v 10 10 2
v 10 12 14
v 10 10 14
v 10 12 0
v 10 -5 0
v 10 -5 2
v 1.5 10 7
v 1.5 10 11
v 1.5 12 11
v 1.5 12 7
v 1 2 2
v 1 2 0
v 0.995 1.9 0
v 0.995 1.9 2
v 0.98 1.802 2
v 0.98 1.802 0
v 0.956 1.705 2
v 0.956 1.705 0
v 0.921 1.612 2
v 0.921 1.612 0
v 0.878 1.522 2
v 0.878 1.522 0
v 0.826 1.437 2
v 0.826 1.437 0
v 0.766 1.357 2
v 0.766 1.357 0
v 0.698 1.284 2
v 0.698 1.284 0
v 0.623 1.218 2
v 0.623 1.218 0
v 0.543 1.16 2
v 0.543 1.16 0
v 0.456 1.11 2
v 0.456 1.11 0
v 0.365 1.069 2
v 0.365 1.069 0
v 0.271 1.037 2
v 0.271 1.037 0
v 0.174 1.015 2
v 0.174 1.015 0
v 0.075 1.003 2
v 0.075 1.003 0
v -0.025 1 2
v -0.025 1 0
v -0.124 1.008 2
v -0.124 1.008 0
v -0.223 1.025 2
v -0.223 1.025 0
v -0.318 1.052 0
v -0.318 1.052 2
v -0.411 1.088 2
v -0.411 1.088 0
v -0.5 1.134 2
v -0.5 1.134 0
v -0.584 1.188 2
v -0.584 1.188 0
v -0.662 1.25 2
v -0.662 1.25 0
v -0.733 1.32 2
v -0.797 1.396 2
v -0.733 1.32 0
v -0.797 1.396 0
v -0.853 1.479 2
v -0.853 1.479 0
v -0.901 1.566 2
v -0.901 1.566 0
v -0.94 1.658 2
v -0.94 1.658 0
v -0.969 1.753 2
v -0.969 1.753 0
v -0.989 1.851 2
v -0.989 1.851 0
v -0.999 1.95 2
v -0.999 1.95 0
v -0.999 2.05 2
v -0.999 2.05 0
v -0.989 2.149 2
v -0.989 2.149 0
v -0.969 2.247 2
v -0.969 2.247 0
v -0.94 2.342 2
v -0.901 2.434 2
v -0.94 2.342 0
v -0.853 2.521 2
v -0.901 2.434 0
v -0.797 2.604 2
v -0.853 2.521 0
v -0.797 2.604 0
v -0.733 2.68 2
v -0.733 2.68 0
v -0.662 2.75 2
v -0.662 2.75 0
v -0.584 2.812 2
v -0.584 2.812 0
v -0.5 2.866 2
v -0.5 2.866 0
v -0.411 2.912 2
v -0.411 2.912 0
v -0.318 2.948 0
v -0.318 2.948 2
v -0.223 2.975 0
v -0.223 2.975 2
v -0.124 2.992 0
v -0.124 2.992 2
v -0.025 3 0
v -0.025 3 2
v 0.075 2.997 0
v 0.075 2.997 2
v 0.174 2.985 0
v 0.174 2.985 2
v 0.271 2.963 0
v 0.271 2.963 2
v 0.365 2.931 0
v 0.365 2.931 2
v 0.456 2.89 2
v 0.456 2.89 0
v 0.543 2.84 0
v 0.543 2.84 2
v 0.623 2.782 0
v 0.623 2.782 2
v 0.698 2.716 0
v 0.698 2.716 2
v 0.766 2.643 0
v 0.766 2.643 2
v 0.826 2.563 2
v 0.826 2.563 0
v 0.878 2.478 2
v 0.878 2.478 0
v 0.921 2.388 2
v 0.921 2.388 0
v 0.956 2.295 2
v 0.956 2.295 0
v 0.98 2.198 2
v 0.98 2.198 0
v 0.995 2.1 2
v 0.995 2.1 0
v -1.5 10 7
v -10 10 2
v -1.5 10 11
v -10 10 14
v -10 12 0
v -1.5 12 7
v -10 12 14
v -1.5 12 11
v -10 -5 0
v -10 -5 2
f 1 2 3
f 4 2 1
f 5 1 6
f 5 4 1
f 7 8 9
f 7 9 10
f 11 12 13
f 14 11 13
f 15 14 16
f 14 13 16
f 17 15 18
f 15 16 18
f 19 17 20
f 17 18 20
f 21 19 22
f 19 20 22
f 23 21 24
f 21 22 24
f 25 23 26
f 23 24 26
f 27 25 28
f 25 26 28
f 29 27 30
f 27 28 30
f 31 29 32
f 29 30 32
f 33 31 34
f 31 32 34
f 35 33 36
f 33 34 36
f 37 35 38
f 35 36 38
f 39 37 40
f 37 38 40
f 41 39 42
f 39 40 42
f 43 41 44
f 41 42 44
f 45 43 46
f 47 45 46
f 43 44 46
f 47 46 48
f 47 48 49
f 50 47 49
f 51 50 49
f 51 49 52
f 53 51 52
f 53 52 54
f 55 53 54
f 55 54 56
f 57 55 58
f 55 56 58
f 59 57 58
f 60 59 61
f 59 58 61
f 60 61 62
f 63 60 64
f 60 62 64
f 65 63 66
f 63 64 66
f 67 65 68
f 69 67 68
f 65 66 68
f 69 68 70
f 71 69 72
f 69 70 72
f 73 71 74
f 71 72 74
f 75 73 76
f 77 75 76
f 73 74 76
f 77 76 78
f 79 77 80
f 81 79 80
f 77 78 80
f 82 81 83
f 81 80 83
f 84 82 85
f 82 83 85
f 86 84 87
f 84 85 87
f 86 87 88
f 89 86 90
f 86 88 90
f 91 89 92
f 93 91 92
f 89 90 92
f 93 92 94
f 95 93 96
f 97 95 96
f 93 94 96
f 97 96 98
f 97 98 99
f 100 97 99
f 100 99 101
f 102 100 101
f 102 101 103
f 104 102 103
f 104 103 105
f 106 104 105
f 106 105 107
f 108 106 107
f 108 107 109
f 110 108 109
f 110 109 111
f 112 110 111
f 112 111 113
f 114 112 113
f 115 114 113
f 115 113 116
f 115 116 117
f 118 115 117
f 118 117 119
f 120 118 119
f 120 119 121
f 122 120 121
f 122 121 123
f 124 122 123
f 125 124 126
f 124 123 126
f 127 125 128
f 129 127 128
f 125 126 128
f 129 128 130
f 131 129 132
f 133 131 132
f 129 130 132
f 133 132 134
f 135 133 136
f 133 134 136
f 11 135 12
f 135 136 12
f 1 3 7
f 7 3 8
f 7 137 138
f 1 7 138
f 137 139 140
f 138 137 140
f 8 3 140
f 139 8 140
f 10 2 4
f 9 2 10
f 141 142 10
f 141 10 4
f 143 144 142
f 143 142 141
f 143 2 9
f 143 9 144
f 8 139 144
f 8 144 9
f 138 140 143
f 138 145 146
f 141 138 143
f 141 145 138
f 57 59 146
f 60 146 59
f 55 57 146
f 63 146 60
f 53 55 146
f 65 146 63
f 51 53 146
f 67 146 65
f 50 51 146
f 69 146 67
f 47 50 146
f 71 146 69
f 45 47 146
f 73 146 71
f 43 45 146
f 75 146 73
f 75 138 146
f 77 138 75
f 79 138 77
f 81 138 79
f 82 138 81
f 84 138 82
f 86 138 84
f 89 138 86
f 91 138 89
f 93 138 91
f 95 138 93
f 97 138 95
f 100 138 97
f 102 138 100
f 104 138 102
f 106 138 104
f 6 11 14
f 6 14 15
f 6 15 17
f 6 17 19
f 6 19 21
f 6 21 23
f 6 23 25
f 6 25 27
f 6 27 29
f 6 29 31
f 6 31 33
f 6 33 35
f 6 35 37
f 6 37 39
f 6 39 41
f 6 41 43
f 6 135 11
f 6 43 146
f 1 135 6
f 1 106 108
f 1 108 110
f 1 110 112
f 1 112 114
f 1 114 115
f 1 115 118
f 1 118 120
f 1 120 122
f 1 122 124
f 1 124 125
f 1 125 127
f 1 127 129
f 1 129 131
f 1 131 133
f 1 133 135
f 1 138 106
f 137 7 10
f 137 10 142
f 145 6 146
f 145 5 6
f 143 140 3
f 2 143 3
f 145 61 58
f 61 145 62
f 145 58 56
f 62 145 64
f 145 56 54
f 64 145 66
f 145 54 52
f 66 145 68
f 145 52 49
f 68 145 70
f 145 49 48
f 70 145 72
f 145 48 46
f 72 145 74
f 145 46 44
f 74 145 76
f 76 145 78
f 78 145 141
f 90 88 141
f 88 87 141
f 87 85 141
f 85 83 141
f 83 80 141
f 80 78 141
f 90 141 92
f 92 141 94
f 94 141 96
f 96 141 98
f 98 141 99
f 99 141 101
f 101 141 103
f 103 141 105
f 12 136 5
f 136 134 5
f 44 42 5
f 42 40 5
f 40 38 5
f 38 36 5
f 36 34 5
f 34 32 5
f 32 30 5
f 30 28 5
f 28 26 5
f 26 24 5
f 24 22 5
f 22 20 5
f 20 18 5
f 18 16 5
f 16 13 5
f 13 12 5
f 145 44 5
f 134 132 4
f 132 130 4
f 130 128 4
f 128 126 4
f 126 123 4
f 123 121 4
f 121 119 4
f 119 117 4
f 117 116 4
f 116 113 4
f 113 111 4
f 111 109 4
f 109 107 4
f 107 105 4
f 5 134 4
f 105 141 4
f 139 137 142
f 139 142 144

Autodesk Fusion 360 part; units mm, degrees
sketch "Szkic1" plane through (0, 0, 0) normal (0, 0, 1) x (1, 0, 0)
  line L0 (-10, 10) -> (10, 10)
  line L1 (10, 10) -> (10, -5)
  line L2 (10, -5) -> (-10, -5)
  line L3 (-10, -5) -> (-10, 10)
  circle A0 centre (0, 2) radius 1
  dimension "d1" = 15
  dimension "d10" = 2
extrude "Wyciągnięcie proste1" add sketch "Szkic1" along normal blind 2 contours L0 L1 L2 L3 | A0
sketch "Szkic2" plane through (0, 10, 0) normal (0, 1, 0) x (-1, 0, 0)
  line L0 (-10, 0) -> (10, 0)
  line L1 (10, 0) -> (10, 2)
  line L2 (10, 2) -> (-10, 2)
  line L3 (-10, 2) -> (-10, 0)
  line L4 (-10, 0) -> (10, 0)
  line L5 (10, 0) -> (10, 14)
  line L6 (10, 14) -> (-10, 14)
  line L7 (-10, 14) -> (-10, 0)
  line L8 (1.5, 11) -> (-1.5, 11)
  line L9 (-1.5, 11) -> (-1.5, 7)
  line L10 (-1.5, 7) -> (1.5, 7)
  line L11 (1.5, 7) -> (1.5, 11)
  dimension "d4" = 8.5
  dimension "d5" = 3
  dimension "d6" = 20
  dimension "d7" = 3
extrude "Wyciągnięcie proste2" add sketch "Szkic2" along normal blind 2
extrude "Wyciągnięcie proste3" cut sketch "Szkic1" along normal blind 3 contours A0
